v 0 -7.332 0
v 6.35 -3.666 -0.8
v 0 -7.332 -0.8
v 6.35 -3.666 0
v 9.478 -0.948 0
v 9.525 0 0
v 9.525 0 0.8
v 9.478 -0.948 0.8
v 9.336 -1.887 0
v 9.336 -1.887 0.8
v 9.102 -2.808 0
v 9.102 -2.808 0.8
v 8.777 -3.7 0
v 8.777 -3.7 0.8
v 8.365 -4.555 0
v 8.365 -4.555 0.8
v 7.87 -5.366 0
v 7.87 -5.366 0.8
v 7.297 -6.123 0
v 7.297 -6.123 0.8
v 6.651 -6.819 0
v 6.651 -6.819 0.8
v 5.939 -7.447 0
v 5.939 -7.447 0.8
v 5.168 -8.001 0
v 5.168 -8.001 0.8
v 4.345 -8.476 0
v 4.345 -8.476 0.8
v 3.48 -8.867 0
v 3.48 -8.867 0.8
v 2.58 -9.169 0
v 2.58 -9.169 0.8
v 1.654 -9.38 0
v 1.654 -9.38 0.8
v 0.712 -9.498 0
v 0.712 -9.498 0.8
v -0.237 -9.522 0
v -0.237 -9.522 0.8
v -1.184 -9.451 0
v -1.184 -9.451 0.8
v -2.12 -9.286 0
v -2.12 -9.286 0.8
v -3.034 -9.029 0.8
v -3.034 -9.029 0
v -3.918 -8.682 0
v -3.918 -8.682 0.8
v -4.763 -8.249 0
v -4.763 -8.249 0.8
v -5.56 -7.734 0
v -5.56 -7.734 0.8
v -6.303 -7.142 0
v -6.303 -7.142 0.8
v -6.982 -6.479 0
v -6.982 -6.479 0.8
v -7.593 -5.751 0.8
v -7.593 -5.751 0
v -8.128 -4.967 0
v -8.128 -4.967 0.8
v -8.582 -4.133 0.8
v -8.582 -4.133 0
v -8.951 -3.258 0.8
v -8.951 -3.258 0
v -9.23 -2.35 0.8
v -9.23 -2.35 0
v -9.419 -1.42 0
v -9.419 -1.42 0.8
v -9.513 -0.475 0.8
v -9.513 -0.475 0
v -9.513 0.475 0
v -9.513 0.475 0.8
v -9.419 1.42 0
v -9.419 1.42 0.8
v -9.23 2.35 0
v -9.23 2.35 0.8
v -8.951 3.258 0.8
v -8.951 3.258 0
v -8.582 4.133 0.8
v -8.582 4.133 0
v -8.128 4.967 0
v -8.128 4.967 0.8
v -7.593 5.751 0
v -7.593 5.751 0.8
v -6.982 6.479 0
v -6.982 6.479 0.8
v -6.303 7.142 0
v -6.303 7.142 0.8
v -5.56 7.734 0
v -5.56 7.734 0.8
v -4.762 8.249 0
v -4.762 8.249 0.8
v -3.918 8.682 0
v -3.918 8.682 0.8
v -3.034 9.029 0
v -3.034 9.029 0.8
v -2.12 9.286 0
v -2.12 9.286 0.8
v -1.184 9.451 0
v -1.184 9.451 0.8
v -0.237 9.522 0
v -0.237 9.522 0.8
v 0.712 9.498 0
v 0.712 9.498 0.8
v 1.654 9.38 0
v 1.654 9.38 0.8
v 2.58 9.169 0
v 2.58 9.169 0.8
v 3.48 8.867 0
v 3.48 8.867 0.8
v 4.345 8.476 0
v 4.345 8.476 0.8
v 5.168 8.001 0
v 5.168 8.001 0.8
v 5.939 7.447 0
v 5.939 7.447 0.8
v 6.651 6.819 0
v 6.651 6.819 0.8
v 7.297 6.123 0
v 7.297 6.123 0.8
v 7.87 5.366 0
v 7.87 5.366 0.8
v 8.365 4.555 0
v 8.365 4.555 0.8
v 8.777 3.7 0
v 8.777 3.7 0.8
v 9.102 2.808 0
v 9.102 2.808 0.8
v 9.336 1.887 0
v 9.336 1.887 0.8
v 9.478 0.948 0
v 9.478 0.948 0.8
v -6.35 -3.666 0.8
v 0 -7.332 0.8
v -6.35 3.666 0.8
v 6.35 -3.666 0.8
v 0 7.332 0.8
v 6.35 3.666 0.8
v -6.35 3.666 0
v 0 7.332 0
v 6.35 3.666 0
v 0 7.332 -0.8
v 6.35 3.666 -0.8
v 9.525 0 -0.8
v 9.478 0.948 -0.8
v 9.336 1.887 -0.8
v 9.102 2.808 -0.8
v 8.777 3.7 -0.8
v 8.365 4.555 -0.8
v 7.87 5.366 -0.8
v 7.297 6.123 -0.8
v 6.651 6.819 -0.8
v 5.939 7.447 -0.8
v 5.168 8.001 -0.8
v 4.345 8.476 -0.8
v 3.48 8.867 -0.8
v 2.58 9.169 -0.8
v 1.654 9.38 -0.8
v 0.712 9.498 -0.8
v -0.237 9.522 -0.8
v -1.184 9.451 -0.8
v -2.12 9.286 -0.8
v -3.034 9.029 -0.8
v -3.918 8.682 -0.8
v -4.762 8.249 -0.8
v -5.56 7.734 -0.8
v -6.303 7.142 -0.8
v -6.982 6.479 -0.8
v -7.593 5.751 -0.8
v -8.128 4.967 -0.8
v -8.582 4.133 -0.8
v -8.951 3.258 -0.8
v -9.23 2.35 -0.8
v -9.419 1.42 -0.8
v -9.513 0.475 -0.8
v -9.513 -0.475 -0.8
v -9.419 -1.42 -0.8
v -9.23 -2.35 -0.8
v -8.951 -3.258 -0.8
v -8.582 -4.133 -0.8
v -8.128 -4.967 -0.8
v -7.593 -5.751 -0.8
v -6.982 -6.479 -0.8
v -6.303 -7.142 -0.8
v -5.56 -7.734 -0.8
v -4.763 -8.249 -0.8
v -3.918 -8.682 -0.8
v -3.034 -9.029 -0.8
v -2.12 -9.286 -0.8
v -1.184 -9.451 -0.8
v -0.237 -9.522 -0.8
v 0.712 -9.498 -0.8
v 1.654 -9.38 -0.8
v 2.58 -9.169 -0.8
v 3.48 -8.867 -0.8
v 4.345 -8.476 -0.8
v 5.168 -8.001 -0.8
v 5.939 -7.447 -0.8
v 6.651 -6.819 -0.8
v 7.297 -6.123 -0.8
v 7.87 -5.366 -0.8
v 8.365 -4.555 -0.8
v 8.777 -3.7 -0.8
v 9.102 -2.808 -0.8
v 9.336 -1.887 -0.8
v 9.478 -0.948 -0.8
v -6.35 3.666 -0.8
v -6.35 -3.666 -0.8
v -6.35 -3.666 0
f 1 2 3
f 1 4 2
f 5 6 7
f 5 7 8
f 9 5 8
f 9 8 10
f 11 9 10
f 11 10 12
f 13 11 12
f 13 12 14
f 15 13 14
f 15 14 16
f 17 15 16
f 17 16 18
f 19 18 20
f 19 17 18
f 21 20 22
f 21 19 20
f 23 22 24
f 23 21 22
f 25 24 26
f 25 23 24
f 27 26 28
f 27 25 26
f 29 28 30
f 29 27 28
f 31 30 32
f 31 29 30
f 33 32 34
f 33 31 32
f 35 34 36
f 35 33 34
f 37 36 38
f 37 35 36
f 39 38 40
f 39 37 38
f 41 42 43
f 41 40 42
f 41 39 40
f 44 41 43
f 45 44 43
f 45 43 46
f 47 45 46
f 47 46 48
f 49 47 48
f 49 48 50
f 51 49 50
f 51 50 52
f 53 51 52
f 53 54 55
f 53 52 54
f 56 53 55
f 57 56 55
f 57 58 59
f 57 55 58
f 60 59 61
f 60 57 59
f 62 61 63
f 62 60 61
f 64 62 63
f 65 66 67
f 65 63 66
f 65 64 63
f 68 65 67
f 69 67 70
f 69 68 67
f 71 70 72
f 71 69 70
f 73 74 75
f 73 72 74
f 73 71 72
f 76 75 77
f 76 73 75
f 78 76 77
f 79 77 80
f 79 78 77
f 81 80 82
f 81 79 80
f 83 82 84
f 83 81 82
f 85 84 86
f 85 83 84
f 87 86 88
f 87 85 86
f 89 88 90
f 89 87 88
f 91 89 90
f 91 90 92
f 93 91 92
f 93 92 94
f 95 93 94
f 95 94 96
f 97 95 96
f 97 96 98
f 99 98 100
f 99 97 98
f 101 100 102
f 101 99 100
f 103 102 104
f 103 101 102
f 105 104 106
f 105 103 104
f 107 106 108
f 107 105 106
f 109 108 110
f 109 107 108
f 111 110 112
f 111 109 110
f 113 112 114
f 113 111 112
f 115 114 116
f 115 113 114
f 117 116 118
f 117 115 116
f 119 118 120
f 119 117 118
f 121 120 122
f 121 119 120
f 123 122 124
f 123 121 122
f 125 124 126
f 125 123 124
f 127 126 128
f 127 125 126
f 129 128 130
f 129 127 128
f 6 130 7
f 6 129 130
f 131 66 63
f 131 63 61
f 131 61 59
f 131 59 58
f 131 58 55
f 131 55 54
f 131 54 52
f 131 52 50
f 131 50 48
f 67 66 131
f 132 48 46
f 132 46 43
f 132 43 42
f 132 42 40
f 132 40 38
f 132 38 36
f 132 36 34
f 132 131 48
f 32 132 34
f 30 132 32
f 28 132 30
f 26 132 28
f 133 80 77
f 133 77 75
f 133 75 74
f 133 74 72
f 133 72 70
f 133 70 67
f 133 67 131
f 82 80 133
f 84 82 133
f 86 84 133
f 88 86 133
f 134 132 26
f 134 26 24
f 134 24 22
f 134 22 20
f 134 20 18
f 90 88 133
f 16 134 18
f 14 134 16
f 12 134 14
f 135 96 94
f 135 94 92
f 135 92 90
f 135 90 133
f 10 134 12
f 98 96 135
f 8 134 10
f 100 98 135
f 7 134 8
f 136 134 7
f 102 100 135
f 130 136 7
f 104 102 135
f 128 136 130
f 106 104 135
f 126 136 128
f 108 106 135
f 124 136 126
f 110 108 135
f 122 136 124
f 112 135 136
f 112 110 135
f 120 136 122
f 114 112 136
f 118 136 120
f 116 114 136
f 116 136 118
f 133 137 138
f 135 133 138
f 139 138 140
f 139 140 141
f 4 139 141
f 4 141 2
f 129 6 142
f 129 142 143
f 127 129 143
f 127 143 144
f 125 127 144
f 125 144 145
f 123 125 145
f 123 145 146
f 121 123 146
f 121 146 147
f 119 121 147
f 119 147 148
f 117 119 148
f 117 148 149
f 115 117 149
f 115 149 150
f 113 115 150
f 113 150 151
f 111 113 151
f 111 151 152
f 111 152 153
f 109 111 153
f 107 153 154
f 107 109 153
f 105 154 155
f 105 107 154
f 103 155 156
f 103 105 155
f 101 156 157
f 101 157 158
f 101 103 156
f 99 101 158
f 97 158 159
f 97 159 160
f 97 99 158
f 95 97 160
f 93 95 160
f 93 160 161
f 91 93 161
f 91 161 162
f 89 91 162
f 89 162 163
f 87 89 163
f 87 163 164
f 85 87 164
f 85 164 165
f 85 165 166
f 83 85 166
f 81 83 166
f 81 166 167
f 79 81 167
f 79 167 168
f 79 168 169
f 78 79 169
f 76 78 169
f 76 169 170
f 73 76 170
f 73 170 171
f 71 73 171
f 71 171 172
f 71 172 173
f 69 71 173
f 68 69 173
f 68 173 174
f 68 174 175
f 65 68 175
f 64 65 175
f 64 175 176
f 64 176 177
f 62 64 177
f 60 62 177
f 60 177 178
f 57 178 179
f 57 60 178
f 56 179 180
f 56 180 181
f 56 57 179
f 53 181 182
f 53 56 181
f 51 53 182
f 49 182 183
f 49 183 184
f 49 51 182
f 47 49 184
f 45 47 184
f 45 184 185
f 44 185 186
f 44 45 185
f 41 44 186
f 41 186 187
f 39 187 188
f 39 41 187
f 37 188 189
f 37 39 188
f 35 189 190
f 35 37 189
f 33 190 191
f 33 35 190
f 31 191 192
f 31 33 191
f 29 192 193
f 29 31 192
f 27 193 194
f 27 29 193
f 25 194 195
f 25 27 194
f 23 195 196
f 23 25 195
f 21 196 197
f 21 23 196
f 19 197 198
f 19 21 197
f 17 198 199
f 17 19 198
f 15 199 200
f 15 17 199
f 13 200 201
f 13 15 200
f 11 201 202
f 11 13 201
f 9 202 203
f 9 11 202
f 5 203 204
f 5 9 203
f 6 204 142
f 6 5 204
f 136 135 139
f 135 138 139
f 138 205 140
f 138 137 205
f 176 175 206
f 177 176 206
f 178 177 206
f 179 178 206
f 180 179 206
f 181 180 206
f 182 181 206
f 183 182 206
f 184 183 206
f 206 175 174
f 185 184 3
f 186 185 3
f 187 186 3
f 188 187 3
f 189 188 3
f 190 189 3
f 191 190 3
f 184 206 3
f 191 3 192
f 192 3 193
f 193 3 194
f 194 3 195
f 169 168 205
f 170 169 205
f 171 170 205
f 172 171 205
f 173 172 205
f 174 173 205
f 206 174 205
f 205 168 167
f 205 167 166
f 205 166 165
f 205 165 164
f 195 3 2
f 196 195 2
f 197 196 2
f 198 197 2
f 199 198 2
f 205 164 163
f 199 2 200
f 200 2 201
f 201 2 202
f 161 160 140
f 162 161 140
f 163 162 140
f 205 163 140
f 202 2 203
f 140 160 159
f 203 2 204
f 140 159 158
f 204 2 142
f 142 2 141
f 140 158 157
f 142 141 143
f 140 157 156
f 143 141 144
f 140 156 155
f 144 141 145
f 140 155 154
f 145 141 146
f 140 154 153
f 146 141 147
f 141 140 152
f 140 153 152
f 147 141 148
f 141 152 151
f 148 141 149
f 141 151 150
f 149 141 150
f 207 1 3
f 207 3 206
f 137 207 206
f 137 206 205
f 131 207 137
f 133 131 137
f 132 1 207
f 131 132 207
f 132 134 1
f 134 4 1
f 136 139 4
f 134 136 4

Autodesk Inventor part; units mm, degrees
ref_plane "YZ Plane" through (0, 0, 0) normal (1, 0, 0) x (0, 1, 0)
ref_plane "XZ Plane" through (0, 0, 0) normal (0, 1, 0) x (-1, 0, 0)
ref_plane "XY Plane" through (0, 0, 0) normal (0, 0, 1) x (1, 0, 0)
sketch "Sketch1" plane through (0, 0, 0) normal (0, 0, 1) x (1, 0, 0)
  circle A0 centre (0, 0) radius 9.525
  line L0 (0, 7.3323) -> (6.35, 3.6662)
  line L1 (6.35, 3.6662) -> (6.35, -3.6662)
  line L2 (6.35, -3.6662) -> (0, -7.3323)
  line L3 (0, -7.3323) -> (-6.35, -3.6662)
  line L4 (-6.35, -3.6662) -> (-6.35, 3.6662)
  line L5 (-6.35, 3.6662) -> (0, 7.3323)
  dimension "d0" = 19.05
  dimension "d2" = 12.7
extrude "Extrusion1" add sketch "Sketch1" along normal mid plane 1.6002
properties part number "500 Hex Spacer x250" material "Nylon 6/6"
